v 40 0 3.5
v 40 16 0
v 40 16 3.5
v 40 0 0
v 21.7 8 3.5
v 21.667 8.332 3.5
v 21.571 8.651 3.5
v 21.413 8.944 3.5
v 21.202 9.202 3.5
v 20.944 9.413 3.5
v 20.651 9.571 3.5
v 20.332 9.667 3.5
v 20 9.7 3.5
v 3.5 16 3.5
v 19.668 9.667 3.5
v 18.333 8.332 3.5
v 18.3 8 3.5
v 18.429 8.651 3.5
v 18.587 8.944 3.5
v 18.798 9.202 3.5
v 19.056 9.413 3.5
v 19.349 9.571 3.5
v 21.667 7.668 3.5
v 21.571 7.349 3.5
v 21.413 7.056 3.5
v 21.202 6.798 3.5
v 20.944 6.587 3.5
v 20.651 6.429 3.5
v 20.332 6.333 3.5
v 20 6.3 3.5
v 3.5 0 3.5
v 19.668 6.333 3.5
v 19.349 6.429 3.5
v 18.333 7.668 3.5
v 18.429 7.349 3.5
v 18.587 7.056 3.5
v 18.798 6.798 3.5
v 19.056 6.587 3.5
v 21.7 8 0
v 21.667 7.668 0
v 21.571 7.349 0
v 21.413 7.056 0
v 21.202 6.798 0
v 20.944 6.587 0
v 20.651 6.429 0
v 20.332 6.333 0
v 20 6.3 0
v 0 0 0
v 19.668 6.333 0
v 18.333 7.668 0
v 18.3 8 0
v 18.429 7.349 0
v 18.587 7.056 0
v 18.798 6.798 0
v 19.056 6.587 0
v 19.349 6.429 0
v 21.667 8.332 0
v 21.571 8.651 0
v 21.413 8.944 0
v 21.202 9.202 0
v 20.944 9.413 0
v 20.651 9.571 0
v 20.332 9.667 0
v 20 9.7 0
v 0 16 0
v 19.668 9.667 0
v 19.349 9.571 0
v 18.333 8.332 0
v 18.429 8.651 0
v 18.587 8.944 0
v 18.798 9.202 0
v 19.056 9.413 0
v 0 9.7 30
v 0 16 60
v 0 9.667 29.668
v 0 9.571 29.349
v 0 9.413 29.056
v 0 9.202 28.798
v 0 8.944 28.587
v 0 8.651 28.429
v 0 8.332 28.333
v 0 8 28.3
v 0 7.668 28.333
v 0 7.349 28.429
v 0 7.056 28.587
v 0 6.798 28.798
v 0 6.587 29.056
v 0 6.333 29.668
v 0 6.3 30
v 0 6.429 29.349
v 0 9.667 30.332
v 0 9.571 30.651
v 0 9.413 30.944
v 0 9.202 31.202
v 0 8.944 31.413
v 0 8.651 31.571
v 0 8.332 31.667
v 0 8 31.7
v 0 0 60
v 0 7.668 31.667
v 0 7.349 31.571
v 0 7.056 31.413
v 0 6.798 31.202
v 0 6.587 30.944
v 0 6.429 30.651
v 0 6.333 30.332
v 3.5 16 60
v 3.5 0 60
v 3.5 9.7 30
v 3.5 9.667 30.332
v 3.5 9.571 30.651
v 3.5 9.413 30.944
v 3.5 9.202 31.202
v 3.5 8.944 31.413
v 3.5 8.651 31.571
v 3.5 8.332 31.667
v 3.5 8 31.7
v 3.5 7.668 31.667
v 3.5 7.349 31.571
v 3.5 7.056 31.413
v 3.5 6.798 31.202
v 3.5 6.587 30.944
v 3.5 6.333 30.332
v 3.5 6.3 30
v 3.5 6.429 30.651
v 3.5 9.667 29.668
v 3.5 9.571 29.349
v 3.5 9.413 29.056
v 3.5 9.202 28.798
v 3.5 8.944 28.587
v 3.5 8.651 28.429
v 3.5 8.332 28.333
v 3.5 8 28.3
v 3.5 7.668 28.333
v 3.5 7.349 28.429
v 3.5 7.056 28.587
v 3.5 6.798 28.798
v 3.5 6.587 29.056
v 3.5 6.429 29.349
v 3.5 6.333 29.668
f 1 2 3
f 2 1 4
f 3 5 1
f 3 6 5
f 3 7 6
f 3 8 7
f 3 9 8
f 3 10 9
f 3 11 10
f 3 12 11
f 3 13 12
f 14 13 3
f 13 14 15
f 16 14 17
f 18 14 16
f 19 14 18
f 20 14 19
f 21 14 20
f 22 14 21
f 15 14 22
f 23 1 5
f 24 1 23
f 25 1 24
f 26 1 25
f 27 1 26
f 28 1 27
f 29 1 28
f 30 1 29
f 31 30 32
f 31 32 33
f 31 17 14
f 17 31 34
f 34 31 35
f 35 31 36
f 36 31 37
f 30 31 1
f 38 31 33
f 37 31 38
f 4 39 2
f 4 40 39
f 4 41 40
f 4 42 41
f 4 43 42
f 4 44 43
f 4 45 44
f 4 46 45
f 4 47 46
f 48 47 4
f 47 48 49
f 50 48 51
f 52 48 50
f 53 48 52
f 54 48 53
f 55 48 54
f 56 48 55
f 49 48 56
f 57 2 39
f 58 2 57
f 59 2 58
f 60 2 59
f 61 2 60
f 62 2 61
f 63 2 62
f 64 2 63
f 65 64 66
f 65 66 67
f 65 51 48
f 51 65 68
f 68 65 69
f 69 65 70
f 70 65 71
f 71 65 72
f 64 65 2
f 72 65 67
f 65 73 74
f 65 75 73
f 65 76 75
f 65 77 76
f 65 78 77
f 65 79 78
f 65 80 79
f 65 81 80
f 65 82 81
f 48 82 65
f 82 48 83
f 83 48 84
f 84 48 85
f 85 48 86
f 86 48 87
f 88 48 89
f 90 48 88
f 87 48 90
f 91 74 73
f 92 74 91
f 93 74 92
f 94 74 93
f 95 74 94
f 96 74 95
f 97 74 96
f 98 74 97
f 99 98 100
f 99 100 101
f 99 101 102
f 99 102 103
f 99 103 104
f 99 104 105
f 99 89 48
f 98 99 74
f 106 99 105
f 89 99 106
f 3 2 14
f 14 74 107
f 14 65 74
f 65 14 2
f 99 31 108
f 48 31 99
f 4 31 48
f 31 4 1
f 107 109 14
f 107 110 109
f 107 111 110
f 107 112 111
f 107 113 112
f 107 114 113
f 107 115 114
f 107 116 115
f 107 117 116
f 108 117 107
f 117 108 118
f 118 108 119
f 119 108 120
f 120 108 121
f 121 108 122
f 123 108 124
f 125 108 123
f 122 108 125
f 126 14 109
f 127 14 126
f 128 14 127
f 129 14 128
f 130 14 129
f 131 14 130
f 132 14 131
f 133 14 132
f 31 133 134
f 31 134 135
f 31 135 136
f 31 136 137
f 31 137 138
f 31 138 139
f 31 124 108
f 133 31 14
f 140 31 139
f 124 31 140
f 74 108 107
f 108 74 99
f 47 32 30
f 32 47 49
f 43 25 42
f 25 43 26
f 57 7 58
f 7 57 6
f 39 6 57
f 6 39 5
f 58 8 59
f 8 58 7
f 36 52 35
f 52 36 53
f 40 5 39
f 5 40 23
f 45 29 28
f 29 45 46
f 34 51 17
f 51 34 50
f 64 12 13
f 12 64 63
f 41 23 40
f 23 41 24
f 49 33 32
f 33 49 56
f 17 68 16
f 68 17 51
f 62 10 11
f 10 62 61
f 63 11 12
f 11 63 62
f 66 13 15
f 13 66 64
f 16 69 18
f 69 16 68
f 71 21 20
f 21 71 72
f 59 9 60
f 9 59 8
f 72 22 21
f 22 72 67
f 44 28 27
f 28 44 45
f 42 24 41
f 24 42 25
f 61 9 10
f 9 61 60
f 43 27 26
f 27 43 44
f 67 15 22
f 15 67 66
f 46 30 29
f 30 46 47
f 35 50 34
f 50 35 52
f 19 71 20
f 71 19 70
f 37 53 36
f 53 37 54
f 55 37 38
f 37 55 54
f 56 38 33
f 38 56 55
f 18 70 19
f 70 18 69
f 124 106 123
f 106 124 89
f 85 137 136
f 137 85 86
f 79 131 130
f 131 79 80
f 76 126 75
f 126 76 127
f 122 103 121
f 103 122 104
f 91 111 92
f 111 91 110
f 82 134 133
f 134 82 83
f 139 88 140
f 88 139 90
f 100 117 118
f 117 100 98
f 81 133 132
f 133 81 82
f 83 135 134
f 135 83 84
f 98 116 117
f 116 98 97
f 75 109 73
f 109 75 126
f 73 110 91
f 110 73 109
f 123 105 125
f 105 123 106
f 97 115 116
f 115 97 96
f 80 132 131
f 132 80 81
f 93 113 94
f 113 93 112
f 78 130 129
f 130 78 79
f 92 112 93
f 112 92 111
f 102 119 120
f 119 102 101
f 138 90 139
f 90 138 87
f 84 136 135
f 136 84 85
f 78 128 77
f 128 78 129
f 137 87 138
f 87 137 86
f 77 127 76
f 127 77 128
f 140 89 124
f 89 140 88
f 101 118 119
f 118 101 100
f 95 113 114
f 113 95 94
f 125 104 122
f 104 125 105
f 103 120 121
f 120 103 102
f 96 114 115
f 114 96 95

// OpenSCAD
$fn = 32;

// ----------------------------------------------------------------------
// L-bracket: 40 x 16 x 60 mm
// ----------------------------------------------------------------------

// --- parameters (mm) ---
arm_x = 40;               // horizontal leg, X
arm_z = 60;               // vertical leg, Z
width = 16;               // bracket depth, Y
wall = 3.5;               // plate thickness
hole_d = 3.4;             // clearance for M3

module hole_z(px, py) {
  translate([px, py, -2.5]) cylinder(h = wall + 5, d = hole_d);
}
module hole_x(pz, py) {
  translate([-2.5, py, pz]) rotate([0, 90, 0]) cylinder(h = wall + 5, d = hole_d);
}

difference() {
  union() {
    /* horizontal leg */
    cube([arm_x, width, wall]);
    /* vertical leg, overlapping the corner block */
    cube([wall, width, arm_z]);
  }
  hole_z(20, 8);
  hole_x(30, 8);
}
